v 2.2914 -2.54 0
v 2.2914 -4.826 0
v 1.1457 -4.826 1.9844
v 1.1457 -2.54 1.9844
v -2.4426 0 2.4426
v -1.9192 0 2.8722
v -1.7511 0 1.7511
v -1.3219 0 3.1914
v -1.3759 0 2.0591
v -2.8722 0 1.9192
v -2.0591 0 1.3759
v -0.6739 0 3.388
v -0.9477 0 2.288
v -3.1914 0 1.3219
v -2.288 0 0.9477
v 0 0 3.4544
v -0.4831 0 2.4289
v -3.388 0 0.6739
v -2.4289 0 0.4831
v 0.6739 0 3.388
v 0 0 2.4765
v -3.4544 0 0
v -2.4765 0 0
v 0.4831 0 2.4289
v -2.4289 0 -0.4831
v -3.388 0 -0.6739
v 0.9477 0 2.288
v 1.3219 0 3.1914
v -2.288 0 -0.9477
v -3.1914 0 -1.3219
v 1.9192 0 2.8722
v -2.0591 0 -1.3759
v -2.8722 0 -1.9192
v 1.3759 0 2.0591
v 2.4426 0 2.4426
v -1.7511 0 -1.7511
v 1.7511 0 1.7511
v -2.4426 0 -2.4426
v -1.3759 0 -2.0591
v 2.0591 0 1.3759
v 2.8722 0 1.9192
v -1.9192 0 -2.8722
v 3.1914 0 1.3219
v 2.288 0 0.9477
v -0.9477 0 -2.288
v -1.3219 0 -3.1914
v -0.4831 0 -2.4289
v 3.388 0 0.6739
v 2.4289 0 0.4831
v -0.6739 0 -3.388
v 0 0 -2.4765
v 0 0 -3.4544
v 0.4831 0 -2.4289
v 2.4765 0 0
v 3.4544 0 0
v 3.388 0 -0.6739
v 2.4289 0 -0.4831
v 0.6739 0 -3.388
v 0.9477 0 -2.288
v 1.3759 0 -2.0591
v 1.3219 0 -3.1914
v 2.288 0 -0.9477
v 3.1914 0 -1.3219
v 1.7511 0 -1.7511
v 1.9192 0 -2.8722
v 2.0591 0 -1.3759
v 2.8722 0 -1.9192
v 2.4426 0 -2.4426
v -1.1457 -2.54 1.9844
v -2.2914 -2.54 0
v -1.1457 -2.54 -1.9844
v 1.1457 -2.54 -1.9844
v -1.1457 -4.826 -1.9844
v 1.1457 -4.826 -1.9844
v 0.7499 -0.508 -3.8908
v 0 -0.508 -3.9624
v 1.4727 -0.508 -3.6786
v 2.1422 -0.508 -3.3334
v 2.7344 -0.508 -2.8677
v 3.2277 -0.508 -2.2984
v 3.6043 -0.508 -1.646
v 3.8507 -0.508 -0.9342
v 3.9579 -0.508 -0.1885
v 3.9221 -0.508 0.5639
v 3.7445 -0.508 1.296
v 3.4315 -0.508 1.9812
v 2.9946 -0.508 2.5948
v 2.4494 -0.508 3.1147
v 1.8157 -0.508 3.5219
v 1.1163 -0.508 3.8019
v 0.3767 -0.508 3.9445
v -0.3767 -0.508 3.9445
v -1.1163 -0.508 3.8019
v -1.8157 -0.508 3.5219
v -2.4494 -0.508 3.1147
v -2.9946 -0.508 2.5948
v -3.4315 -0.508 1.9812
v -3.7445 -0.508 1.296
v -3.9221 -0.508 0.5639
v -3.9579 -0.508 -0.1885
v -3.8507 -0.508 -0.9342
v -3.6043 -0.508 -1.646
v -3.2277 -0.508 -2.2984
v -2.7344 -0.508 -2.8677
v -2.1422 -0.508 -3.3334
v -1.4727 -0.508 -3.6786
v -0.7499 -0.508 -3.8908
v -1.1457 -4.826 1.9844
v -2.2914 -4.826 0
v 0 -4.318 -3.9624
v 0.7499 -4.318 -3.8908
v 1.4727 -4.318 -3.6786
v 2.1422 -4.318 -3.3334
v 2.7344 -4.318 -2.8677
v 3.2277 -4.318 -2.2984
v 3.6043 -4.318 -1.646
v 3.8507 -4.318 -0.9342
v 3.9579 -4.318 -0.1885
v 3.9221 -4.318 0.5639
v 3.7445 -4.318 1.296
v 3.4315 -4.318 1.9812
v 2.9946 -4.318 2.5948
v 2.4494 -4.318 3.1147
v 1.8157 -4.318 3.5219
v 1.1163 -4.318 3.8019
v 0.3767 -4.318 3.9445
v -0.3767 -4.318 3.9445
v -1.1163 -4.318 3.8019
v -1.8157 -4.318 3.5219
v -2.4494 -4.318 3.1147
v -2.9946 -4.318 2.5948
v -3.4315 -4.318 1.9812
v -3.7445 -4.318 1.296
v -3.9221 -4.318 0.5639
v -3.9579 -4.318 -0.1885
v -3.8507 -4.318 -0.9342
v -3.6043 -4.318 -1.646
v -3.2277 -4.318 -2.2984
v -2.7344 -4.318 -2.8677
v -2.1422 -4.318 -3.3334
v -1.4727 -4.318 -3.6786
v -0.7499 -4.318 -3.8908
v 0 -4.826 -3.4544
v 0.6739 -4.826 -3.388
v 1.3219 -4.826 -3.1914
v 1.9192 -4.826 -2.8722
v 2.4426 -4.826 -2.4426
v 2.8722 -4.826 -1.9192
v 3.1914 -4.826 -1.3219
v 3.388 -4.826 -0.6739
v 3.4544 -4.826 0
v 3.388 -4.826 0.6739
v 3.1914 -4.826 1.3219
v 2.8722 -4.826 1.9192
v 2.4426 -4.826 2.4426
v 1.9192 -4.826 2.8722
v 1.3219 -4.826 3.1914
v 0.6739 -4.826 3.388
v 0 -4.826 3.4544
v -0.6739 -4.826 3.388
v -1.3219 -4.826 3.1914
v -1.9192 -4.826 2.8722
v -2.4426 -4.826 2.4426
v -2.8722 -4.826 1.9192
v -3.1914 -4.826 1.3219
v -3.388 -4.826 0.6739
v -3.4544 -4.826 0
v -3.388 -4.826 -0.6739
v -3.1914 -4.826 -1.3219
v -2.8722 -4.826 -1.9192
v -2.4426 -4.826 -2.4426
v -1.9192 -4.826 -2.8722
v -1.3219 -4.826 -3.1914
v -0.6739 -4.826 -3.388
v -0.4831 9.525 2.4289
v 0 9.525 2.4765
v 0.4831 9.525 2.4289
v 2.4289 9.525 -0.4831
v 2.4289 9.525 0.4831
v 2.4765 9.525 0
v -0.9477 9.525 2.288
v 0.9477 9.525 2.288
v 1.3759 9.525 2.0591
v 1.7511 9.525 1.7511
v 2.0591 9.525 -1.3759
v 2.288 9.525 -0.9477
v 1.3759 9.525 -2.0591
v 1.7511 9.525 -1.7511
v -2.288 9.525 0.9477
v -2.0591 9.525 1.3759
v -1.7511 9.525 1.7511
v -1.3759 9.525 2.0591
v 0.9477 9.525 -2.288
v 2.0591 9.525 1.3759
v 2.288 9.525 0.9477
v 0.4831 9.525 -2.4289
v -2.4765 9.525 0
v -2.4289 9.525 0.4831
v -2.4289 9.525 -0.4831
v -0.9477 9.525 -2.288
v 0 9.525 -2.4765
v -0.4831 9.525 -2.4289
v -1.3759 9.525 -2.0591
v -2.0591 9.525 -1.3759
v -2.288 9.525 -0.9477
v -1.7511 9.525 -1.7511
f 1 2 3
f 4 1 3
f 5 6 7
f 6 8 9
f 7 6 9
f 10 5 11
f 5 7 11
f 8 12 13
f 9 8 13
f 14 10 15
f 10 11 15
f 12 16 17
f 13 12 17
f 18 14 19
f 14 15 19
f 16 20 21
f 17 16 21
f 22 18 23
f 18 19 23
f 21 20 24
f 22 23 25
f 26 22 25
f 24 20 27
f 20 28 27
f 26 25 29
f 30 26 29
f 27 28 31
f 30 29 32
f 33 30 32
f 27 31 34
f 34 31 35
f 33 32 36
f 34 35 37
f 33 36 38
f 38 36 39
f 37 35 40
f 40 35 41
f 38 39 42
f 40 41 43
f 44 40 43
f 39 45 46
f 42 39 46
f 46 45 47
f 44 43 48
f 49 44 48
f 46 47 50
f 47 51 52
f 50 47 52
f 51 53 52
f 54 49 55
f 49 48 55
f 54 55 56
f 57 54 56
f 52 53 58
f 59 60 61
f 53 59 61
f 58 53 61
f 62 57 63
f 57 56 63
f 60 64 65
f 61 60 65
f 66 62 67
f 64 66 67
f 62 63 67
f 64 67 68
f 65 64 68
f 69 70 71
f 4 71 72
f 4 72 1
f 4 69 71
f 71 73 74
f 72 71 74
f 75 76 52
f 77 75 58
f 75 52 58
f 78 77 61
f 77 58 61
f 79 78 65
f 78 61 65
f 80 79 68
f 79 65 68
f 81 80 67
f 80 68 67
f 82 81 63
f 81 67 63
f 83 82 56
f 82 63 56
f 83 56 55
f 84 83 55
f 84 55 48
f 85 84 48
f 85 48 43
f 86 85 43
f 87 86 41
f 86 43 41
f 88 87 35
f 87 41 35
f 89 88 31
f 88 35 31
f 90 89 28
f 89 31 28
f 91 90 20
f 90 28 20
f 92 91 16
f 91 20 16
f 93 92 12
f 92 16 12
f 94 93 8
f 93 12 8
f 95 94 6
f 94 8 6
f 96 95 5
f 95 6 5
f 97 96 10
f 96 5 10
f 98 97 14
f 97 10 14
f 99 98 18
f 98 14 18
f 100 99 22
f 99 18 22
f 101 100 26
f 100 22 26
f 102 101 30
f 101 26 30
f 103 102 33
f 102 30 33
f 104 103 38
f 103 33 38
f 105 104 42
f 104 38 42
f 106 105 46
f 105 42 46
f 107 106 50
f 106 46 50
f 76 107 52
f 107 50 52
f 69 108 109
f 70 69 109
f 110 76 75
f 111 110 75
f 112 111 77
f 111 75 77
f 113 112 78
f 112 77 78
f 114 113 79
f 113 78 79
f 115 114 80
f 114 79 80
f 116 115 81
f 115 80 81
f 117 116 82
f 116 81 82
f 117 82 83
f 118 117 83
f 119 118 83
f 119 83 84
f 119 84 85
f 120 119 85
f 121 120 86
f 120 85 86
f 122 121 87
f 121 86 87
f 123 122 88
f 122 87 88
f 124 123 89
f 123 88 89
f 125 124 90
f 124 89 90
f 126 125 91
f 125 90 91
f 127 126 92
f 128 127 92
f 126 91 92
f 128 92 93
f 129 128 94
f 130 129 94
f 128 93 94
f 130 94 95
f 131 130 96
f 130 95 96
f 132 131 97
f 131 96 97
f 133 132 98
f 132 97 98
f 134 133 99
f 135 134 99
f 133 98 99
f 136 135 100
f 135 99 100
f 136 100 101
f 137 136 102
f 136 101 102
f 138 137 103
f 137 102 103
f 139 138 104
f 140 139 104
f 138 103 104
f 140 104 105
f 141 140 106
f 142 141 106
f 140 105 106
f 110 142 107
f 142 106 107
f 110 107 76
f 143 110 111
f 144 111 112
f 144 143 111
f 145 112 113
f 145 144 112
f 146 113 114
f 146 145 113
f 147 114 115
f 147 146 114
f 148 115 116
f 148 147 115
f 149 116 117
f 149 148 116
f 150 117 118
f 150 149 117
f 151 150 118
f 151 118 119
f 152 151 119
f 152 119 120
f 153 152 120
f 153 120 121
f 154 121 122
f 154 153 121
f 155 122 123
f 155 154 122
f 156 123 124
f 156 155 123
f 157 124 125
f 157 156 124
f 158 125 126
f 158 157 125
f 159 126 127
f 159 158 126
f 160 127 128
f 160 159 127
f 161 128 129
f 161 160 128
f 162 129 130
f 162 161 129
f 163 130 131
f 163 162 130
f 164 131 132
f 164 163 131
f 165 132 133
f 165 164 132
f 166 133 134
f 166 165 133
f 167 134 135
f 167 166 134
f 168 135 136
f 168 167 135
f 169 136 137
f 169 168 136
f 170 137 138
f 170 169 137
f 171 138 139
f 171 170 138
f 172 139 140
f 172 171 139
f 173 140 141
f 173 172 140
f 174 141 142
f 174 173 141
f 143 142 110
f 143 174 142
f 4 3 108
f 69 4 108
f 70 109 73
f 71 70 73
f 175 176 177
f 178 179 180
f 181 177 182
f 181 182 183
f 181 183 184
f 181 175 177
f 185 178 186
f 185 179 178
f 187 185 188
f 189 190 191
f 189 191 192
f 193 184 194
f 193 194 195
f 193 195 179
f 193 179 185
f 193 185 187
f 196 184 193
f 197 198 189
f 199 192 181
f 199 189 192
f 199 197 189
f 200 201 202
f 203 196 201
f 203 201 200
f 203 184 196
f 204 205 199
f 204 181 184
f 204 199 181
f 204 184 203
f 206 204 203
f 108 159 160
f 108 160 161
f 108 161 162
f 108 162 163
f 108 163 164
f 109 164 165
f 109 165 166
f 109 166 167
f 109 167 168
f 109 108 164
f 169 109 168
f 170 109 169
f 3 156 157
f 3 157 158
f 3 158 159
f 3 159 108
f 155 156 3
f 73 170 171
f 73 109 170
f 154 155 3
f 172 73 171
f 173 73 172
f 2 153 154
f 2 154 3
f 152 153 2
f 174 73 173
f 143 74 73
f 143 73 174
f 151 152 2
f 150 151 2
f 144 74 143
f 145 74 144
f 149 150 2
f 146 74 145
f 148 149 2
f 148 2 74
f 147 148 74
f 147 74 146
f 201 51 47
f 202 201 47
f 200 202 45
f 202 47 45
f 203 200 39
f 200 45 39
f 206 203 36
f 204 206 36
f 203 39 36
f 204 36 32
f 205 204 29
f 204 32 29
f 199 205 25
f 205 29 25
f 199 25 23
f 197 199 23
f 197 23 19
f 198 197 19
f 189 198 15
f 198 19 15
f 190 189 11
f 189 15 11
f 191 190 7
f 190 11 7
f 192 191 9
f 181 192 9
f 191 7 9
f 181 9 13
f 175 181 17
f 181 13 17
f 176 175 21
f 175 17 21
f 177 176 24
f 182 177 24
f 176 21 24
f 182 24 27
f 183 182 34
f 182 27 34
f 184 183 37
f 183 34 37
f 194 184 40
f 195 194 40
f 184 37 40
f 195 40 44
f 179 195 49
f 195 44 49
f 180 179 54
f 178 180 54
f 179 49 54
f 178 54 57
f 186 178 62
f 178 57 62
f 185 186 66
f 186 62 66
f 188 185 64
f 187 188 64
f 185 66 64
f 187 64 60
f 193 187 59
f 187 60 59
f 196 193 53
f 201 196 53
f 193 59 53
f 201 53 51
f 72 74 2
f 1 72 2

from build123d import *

# Parameters (mm, degrees)
SKETCH1_R           = 2.4765
BOSS_EXTRUDE1_DEPTH = 9.525
SKETCH2_R           = 3.9624
BOSS_EXTRUDE2_DEPTH = 4.826
CUT_EXTRUDE1_DEPTH  = 2.286
CHAMFER1_SIZE       = 0.508


with BuildPart() as part:
    # Sketch1 → Boss-Extrude1 (new body)
    with BuildSketch(Plane(origin=(0, 0, 0), x_dir=(1, 0, 0), z_dir=(0, 1, 0))):
        with Locations(Location((0, 0, 0), (0, 0, 90))):
            Circle(SKETCH1_R)
    extrude(amount=BOSS_EXTRUDE1_DEPTH)

    # Sketch2 → Boss-Extrude2 (add)
    with BuildSketch(Plane.XZ):
        with Locations(Location((0, 0, 0), (0, 0, 270))):
            Circle(SKETCH2_R)
    extrude(amount=BOSS_EXTRUDE2_DEPTH)

    # Sketch3 → Cut-Extrude1 (cut)
    with BuildSketch(Plane.XZ.offset(4.826)):
        Polygon((2.291358881, 0), (1.14567944, 1.984375), (-1.14567944, 1.984375), (-2.291358881, 0), (-1.14567944, -1.984375), (1.14567944, -1.984375), align=None)
    extrude(amount=-CUT_EXTRUDE1_DEPTH, mode=Mode.SUBTRACT)

    # Chamfer1
    chamfer1_edges = [part.edges().sort_by_distance(p)[0] for p in [
        (0, 0, 3.9624),
        (0, -4.826, 3.9624),
    ]]
    chamfer(chamfer1_edges, length=CHAMFER1_SIZE)


solid = part.part
